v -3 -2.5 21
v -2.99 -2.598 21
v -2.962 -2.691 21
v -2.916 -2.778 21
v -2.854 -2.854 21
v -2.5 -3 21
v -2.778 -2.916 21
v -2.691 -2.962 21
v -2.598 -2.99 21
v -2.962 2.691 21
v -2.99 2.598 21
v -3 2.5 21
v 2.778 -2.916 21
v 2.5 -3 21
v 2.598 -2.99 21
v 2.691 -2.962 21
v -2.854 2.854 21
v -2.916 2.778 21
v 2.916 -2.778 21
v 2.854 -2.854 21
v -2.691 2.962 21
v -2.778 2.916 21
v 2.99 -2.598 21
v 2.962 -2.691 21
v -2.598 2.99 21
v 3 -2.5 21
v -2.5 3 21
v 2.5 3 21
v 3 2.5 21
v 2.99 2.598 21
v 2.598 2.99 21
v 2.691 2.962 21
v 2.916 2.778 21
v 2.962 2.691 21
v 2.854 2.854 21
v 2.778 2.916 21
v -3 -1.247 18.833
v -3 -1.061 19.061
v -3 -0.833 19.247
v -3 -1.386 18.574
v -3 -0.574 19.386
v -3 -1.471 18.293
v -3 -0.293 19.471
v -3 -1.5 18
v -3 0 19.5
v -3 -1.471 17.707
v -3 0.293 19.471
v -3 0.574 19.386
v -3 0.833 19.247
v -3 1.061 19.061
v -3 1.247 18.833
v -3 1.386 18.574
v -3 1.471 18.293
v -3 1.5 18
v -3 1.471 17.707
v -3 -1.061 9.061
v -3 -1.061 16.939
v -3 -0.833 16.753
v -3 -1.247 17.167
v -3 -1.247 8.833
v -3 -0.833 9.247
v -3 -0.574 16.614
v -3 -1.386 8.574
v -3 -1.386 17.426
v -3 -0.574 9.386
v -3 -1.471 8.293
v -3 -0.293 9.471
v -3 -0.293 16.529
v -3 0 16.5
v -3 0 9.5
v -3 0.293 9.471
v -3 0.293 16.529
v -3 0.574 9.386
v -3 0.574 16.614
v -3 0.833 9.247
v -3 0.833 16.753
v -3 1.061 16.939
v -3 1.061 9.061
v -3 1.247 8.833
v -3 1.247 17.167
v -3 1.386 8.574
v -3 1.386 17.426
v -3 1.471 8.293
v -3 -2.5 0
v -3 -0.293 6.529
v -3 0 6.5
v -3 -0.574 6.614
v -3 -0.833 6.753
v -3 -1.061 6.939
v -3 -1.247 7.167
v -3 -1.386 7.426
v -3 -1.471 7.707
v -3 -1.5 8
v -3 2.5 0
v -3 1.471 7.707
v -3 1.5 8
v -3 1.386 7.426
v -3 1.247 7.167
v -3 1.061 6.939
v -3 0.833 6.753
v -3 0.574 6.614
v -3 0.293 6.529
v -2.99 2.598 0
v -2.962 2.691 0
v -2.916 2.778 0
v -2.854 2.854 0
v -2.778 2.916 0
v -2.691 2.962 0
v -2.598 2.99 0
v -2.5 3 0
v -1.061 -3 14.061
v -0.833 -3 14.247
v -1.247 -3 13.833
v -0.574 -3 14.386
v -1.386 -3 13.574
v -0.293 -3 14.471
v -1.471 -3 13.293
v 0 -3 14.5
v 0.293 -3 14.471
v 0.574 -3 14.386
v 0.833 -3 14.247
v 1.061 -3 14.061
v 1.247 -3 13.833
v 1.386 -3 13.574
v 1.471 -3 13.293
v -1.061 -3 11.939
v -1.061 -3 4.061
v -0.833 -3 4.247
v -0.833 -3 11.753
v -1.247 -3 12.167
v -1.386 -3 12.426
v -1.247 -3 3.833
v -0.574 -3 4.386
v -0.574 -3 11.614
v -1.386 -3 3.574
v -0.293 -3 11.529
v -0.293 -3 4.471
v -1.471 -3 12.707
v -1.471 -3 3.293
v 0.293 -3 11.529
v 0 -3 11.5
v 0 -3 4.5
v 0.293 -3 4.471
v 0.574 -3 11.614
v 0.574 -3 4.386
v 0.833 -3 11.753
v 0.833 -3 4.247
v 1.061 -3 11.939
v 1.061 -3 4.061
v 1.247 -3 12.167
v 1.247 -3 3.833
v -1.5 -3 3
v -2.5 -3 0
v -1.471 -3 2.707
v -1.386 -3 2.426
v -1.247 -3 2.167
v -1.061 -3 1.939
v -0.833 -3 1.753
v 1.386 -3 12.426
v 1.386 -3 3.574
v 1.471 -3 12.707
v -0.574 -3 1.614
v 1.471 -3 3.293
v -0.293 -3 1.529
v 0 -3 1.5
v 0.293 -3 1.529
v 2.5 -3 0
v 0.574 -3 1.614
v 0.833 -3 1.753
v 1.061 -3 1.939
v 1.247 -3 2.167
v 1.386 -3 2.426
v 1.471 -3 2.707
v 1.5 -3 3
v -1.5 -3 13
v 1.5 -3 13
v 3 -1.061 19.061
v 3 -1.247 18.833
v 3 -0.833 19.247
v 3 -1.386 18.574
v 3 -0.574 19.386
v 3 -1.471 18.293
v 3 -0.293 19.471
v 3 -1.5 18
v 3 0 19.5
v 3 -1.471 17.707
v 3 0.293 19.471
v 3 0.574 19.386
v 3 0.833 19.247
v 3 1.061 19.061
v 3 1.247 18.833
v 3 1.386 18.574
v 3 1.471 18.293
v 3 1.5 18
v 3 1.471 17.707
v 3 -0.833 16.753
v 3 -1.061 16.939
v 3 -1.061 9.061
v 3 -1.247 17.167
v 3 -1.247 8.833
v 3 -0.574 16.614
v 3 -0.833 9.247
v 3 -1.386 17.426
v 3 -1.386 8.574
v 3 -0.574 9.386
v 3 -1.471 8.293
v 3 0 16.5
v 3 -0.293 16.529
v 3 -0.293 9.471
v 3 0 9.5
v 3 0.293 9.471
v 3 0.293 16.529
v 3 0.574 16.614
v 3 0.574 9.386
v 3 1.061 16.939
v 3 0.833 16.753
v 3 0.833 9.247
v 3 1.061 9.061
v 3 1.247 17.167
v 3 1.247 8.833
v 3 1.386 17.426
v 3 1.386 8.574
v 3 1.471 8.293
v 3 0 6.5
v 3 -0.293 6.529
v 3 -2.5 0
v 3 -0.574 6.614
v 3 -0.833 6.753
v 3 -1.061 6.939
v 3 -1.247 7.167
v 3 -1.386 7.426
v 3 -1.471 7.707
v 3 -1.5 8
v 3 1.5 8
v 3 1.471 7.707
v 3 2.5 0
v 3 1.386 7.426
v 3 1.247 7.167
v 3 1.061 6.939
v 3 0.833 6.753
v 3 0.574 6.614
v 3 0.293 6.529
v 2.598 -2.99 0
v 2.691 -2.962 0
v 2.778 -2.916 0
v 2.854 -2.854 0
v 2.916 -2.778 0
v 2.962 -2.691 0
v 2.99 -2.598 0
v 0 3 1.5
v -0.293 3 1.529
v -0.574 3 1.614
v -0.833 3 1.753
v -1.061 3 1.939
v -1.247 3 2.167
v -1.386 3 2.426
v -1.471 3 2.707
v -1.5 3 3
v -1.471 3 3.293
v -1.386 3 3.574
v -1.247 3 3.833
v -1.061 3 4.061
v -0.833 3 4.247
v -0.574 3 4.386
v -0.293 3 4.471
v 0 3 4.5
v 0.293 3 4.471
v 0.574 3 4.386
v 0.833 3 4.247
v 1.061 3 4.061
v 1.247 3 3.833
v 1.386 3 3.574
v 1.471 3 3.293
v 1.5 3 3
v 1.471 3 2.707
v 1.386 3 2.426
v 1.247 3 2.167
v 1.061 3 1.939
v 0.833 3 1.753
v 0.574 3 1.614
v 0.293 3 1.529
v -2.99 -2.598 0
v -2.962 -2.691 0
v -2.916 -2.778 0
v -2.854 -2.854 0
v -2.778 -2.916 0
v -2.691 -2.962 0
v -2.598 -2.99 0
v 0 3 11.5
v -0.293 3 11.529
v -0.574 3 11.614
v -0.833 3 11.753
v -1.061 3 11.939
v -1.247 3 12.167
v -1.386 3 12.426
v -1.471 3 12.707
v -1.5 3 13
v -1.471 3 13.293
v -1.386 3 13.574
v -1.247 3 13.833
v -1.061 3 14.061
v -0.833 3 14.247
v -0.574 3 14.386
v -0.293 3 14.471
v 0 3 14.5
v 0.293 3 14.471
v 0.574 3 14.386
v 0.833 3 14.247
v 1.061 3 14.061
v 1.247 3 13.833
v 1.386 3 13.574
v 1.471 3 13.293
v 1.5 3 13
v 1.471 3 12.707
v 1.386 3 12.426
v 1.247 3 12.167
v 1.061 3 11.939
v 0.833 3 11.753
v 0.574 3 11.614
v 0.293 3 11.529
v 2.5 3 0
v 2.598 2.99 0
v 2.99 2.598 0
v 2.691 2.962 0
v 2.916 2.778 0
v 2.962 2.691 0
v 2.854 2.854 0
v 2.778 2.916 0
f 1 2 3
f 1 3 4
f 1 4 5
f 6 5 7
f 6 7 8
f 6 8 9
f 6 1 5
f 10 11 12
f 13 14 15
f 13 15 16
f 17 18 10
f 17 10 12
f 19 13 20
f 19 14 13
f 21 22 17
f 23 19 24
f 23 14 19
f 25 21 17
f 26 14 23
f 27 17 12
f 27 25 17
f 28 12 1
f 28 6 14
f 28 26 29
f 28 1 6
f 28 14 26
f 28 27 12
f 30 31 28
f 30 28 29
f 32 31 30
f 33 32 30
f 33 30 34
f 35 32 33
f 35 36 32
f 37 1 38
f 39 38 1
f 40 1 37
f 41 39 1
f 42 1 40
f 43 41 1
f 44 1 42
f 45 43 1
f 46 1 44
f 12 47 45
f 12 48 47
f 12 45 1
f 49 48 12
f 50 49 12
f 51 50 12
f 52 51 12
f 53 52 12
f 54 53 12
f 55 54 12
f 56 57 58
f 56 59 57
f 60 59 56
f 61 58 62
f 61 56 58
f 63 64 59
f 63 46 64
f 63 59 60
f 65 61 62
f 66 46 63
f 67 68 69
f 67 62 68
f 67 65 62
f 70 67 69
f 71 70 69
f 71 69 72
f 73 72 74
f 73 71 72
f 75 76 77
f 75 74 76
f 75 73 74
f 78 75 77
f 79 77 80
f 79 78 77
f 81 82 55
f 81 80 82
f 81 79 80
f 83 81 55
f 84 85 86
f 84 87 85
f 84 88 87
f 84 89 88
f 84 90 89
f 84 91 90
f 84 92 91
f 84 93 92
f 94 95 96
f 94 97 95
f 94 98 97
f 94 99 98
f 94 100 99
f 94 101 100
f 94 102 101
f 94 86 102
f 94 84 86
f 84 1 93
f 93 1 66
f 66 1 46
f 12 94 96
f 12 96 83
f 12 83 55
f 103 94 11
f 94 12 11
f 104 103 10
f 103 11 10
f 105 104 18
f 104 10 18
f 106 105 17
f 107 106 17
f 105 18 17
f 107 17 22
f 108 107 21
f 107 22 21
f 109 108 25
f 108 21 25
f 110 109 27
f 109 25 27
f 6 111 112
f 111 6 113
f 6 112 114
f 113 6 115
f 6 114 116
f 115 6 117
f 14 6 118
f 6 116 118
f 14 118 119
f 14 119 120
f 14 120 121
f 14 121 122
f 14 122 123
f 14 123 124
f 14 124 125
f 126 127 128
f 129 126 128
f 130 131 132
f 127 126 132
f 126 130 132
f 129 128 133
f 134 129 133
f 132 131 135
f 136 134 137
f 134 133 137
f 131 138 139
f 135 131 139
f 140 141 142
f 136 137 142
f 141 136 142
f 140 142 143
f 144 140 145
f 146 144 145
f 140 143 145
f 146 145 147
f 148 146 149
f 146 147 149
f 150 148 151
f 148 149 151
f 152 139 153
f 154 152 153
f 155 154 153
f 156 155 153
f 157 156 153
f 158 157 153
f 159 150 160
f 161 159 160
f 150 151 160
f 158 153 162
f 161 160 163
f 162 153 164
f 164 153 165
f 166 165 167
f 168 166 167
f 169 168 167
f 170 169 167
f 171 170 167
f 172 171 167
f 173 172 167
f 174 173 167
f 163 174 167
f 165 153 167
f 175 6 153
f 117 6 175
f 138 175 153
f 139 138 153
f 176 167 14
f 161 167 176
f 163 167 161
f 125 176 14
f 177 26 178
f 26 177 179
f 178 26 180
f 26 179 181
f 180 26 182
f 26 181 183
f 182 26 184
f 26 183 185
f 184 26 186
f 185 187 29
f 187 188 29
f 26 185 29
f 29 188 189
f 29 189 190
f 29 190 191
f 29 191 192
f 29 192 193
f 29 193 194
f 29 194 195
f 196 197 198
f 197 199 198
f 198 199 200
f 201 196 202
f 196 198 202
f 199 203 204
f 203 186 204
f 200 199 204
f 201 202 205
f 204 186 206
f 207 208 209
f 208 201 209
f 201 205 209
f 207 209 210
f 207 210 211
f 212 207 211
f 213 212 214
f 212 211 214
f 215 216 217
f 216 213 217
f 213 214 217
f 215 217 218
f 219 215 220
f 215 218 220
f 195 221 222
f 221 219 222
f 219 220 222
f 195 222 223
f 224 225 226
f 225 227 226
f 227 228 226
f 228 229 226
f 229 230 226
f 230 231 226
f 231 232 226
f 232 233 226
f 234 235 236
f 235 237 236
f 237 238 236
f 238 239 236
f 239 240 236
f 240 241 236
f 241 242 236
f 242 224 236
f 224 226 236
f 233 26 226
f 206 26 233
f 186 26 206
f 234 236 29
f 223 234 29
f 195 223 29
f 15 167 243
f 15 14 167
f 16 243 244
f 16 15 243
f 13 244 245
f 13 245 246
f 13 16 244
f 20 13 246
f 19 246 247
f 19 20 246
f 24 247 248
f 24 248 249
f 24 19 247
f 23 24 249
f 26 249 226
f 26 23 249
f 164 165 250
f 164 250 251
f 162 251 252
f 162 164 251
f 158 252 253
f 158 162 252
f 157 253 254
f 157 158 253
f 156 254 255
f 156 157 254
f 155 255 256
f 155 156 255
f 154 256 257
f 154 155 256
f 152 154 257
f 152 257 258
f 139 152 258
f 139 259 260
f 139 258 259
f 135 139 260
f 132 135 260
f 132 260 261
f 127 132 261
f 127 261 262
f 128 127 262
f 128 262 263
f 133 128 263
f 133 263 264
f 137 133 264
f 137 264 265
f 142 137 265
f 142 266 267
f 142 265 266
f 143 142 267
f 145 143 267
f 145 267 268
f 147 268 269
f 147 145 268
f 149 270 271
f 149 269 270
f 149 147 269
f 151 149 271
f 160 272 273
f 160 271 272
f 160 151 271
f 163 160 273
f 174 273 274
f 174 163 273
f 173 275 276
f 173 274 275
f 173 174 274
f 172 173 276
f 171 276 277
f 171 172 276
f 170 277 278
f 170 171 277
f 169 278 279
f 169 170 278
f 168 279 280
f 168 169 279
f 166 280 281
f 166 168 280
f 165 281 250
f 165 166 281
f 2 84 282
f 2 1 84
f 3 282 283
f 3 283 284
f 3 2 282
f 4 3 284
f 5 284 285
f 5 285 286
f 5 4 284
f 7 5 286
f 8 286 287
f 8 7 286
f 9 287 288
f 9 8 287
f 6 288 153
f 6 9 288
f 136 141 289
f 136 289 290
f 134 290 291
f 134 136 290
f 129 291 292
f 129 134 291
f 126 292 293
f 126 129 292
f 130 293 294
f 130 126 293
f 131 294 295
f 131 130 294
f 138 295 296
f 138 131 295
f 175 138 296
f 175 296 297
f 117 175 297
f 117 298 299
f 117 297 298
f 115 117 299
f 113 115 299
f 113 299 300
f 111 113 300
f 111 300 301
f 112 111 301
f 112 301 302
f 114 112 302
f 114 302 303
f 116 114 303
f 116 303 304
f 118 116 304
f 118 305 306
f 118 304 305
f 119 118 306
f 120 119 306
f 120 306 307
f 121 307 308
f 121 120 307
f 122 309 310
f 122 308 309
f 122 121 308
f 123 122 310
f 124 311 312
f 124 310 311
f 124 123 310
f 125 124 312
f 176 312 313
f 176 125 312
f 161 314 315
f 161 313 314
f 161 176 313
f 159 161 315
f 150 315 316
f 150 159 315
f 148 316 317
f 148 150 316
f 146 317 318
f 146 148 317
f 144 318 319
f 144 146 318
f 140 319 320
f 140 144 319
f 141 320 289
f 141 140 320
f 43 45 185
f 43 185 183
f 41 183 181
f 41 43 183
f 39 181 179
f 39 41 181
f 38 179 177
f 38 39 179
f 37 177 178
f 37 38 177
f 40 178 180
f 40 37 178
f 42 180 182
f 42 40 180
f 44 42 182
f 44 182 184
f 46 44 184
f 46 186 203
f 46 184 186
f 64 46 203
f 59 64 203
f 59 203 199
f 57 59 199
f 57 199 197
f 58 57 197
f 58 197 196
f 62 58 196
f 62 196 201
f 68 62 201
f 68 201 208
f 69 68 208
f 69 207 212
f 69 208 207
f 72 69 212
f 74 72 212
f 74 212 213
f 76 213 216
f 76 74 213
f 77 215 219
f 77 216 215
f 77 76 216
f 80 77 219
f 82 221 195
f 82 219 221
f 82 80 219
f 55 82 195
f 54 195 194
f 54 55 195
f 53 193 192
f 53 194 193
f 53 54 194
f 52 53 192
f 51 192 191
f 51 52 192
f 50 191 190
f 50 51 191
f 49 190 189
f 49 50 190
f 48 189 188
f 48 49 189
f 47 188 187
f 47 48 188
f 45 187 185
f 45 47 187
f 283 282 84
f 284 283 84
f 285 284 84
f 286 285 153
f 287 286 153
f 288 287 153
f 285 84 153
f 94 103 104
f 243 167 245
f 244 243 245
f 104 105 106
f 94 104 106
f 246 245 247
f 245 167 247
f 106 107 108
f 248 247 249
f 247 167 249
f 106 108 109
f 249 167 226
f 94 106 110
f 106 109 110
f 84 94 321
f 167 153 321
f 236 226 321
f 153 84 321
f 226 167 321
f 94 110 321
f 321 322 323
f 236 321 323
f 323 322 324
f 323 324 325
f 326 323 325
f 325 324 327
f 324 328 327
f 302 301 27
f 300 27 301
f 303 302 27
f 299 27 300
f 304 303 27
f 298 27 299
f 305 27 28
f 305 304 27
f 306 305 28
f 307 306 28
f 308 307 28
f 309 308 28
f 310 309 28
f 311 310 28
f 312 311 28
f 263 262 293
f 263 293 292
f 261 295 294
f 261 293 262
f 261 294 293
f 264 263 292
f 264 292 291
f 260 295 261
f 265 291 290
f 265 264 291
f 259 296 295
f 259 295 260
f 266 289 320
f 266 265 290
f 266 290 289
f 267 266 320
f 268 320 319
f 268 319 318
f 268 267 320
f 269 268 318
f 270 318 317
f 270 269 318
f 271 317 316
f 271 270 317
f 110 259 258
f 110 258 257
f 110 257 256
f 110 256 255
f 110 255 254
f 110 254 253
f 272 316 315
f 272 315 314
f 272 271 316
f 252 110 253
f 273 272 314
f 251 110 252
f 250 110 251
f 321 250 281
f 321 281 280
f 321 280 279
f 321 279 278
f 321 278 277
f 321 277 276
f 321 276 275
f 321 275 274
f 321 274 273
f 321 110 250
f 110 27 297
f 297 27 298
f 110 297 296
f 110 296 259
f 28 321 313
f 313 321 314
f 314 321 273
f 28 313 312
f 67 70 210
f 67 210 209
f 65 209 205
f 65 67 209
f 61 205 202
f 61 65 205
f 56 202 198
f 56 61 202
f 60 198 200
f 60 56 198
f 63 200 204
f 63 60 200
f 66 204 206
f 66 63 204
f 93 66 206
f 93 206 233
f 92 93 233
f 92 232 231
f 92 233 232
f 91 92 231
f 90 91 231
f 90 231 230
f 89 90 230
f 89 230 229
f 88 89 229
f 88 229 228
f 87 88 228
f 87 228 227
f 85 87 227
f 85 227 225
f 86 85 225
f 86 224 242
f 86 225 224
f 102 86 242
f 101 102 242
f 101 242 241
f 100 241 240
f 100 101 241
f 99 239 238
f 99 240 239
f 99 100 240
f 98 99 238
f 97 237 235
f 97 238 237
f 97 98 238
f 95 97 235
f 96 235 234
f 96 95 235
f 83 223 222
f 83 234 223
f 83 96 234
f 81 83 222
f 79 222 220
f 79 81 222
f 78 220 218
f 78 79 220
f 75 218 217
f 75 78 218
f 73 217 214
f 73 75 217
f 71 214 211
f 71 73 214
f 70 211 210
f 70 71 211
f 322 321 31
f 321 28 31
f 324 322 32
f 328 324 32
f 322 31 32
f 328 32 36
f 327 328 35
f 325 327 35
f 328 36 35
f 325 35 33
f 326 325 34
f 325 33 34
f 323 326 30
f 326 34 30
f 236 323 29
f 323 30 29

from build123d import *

# Parameters (mm, degrees)
SKETCH_1_W               = 6
SKETCH_1_H               = 6
EXTRUDE_1_DEPTH          = 21
CUT_EXTRUDE_1_DEPTH      = 21
CUT_EXTRUDE_1_DEPTH_BACK = 21
SKETCH_3_R               = 1.5
CUT_EXTRUDE_2_DEPTH      = 21
CUT_EXTRUDE_2_DEPTH_BACK = 21
SKETCH_4_R               = 1.5
FILLET_1_R               = 0.5


with BuildPart() as part:
    # 草图1 → 凸台-拉伸1 (new body)
    with BuildSketch(Plane.XY):
        Rectangle(SKETCH_1_W, SKETCH_1_H)
    extrude(amount=EXTRUDE_1_DEPTH)

    # 草图3 → 切除-拉伸1 (cut, two sides: drawn at the far end of the back side and taken through both)
    with BuildSketch(Plane(origin=(0, 0, 0), x_dir=(1, 0, 0), z_dir=(0, 1, 0)).offset(-CUT_EXTRUDE_1_DEPTH_BACK)):
        with Locations(Location((0, -3, 0), (0, 0, 90))):
            Circle(SKETCH_3_R)
        with Locations(Location((0, -13, 0), (0, 0, 90))):
            Circle(SKETCH_3_R)
    extrude(amount=CUT_EXTRUDE_1_DEPTH + CUT_EXTRUDE_1_DEPTH_BACK, mode=Mode.SUBTRACT)

    # 草图4 → 切除-拉伸2 (cut, two sides: drawn at the far end of the back side and taken through both)
    with BuildSketch(Plane(origin=(0, 0, 0), x_dir=(0, 0, -1), z_dir=(1, 0, 0)).offset(-CUT_EXTRUDE_2_DEPTH_BACK)):
        with Locations(Location((-18, 0, 0), (0, 0, 180))):
            Circle(SKETCH_4_R)
        with Locations(Location((-8, 0, 0), (0, 0, 180))):
            Circle(SKETCH_4_R)
    extrude(amount=CUT_EXTRUDE_2_DEPTH + CUT_EXTRUDE_2_DEPTH_BACK, mode=Mode.SUBTRACT)

    # 圆角1
    fillet_1_edges = [part.edges().sort_by_distance(p)[0] for p in [
        (3, -3, 10.5),
        (-3, -3, 10.5),
        (-3, 3, 10.5),
        (3, 3, 10.5),
    ]]
    fillet(fillet_1_edges, radius=FILLET_1_R)


solid = part.part
